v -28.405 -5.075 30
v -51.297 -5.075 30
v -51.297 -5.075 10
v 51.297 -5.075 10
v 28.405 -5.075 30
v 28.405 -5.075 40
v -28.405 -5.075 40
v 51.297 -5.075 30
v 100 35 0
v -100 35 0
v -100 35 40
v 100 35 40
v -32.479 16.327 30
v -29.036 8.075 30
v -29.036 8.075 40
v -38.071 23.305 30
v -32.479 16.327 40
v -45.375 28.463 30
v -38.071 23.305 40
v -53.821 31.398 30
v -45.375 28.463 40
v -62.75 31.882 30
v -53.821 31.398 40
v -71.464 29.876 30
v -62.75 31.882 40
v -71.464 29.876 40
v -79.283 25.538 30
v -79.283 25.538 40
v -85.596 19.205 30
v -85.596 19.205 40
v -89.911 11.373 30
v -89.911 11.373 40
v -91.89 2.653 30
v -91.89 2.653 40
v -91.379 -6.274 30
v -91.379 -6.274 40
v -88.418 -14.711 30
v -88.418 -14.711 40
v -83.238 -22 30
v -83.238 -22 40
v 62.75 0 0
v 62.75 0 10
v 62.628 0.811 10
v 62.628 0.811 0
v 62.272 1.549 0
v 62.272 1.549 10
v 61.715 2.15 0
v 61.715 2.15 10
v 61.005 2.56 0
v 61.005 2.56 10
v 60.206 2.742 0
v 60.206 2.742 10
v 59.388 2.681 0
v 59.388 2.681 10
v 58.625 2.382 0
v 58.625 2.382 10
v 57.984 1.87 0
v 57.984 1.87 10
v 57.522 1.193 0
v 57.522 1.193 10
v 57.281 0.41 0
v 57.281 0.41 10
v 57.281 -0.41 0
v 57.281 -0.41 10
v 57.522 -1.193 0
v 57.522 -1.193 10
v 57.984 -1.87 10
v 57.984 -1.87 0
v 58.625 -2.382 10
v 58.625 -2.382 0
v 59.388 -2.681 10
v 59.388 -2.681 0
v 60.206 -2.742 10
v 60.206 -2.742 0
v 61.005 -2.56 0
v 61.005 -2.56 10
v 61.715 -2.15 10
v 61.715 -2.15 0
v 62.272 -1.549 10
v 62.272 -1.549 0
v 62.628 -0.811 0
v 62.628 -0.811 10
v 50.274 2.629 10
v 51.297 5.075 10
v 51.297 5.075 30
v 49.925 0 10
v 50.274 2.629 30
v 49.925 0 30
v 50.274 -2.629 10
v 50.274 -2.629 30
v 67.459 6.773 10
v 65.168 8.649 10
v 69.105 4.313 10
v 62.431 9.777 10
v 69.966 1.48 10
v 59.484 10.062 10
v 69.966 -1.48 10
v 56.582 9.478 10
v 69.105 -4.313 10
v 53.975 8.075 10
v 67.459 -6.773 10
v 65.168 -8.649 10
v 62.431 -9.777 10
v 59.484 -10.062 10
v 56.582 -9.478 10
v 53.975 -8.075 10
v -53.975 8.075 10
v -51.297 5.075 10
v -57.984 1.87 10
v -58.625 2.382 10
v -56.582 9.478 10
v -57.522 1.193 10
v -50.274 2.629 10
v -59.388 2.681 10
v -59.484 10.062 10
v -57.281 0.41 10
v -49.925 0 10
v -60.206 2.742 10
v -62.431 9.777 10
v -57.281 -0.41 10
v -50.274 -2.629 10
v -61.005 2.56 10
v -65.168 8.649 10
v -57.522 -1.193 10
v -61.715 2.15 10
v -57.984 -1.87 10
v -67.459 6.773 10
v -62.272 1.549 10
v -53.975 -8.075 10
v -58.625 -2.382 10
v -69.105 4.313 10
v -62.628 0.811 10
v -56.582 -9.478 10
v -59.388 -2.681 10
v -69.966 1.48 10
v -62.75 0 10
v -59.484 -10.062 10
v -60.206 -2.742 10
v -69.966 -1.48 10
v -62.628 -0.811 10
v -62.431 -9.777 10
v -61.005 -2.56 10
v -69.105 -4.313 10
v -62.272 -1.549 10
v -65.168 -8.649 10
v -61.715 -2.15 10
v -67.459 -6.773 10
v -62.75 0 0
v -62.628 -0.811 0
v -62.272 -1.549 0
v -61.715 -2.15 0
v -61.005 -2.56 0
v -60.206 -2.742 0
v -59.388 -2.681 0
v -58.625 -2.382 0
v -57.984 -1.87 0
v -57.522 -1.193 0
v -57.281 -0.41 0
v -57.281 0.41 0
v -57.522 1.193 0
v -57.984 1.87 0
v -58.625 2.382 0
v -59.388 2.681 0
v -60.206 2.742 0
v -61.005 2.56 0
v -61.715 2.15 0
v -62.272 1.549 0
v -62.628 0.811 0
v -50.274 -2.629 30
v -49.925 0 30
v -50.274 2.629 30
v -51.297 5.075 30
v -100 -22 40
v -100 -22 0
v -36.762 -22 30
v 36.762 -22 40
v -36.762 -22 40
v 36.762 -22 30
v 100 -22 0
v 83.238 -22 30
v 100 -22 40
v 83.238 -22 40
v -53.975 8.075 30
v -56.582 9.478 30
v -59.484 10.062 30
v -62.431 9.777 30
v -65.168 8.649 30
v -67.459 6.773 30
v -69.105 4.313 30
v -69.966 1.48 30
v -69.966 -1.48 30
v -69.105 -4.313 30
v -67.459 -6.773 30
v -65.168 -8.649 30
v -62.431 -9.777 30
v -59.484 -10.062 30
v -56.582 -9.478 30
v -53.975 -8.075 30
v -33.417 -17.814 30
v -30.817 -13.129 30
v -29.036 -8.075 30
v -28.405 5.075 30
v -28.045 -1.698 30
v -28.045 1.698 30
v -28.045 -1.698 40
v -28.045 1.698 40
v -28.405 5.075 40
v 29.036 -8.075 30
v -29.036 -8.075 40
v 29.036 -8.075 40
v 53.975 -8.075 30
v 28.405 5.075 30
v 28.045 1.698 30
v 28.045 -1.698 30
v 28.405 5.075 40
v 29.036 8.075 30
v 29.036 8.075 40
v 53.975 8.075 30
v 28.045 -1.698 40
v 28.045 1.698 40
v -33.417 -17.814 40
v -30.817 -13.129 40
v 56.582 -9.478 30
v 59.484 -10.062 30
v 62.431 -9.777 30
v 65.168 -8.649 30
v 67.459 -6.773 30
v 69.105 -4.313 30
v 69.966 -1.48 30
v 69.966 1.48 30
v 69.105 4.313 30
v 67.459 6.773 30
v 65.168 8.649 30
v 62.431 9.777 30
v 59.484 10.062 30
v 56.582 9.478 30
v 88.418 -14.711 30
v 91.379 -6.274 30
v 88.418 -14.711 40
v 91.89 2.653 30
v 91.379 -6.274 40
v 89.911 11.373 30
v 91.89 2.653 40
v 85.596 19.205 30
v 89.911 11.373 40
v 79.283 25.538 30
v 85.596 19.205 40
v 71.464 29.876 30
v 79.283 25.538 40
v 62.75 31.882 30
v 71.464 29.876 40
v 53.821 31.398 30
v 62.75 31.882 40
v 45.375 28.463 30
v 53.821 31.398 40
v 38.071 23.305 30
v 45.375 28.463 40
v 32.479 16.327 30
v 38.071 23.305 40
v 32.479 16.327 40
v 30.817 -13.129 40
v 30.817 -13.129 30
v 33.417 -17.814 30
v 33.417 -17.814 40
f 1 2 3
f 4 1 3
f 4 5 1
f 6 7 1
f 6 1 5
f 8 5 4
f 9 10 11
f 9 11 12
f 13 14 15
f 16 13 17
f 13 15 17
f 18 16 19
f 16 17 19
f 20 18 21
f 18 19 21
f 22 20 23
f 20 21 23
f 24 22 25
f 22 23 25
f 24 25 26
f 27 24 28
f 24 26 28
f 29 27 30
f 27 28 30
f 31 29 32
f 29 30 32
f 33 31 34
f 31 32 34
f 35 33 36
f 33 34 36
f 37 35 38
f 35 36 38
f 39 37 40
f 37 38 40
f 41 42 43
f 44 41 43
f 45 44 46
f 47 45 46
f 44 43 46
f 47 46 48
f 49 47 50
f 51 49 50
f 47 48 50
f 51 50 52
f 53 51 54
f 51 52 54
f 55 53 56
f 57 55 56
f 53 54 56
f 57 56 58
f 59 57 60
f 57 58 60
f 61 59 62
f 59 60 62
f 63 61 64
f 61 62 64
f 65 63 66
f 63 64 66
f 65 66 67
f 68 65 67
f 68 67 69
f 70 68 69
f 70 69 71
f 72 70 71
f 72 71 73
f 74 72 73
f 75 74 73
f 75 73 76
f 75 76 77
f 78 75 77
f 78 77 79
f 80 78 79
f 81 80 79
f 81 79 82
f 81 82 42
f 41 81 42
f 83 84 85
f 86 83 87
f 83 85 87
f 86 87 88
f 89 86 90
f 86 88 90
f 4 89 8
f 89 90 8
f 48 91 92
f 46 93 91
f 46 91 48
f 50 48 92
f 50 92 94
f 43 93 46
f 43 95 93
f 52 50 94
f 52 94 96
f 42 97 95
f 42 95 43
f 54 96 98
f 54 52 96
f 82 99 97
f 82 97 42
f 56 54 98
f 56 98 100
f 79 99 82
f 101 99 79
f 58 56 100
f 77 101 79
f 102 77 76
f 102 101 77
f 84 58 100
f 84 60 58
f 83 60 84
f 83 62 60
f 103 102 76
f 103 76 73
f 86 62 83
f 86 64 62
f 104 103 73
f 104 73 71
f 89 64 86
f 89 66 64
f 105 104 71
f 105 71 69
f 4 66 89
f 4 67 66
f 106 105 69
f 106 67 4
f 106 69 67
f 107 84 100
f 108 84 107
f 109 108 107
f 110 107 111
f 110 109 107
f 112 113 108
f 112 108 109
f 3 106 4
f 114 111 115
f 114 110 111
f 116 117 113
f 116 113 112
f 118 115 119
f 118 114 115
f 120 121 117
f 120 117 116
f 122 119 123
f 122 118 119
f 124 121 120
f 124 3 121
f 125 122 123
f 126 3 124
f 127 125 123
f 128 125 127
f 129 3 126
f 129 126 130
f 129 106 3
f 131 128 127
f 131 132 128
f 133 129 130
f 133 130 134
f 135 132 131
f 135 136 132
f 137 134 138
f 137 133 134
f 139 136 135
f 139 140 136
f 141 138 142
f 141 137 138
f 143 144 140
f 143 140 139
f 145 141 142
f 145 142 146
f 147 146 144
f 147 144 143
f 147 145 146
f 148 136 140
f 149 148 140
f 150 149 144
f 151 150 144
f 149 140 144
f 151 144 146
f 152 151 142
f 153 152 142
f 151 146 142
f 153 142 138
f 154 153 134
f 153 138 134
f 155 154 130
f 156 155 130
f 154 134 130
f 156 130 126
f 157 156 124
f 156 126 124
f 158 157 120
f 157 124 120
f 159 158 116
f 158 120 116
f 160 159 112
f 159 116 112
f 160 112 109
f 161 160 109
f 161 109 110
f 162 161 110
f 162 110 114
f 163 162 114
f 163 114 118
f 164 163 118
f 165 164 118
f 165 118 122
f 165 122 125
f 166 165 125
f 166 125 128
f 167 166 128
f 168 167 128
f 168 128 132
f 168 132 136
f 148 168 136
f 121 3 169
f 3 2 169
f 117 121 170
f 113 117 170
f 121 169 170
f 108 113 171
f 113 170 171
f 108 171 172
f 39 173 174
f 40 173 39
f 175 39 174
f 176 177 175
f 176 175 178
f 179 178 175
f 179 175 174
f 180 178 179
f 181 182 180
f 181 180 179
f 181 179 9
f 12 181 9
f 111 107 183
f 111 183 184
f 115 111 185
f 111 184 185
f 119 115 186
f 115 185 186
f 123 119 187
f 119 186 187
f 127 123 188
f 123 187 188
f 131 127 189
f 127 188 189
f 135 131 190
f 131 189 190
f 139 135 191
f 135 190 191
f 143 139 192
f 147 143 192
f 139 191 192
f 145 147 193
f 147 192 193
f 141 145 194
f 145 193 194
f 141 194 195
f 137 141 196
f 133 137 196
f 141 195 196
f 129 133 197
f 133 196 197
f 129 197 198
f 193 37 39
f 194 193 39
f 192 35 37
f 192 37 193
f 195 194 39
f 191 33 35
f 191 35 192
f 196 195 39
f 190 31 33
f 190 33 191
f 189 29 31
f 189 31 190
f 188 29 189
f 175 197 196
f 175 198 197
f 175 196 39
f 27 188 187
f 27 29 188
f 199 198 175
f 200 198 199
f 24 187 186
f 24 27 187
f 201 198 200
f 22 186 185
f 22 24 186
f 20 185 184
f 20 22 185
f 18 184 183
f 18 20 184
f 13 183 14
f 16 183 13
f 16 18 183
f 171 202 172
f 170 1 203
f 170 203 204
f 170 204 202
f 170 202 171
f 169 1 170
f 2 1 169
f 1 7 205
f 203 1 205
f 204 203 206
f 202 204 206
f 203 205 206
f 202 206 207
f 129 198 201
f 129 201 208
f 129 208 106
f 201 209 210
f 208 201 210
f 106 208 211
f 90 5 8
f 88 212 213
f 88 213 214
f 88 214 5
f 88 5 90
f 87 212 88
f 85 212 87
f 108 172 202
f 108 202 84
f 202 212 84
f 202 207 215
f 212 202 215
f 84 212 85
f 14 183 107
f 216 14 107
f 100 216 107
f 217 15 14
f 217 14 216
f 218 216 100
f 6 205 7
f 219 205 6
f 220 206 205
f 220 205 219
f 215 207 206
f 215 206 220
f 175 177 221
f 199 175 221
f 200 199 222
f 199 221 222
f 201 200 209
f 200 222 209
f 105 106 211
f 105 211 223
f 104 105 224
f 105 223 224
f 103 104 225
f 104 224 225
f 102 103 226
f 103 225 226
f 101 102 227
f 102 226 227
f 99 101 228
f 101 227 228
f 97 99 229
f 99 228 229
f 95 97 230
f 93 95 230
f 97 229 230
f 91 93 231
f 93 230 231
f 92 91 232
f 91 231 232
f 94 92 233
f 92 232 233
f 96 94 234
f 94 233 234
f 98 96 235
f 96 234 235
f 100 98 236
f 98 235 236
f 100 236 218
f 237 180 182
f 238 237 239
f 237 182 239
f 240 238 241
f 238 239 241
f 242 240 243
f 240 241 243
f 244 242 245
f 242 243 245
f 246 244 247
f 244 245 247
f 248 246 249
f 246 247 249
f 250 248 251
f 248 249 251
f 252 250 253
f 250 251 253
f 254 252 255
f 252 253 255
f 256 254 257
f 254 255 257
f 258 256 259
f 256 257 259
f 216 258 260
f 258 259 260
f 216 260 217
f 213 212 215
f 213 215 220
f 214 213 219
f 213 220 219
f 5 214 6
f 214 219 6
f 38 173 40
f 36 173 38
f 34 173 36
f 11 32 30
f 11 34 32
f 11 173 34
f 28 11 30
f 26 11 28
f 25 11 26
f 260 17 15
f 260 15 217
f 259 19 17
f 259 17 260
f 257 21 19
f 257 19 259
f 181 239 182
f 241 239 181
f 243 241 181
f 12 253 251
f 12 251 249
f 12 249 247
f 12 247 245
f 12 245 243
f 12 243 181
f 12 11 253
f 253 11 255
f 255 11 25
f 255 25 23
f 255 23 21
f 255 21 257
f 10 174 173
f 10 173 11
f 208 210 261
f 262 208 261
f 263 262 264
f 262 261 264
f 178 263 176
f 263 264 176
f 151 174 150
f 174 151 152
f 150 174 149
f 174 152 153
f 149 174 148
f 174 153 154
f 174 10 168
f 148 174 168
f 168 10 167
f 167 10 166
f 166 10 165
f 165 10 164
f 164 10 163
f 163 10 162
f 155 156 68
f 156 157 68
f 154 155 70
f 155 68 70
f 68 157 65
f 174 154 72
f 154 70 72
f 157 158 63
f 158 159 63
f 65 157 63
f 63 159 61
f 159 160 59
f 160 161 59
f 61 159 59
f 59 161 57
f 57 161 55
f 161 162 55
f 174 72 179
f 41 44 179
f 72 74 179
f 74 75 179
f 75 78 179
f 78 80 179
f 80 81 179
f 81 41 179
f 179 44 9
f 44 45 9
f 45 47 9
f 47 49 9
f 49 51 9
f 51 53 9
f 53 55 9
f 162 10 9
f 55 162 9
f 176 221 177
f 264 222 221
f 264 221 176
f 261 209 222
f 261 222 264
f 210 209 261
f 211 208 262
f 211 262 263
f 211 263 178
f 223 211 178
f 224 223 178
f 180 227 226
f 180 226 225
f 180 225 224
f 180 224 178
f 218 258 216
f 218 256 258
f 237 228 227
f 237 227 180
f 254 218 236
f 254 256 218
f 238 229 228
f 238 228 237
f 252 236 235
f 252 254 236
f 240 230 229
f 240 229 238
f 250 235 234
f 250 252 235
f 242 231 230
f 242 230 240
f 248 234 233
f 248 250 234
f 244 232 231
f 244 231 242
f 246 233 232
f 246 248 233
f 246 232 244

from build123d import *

# Parameters (mm, degrees)
SKETCH1_W                     = 200
SKETCH1_H                     = 70
BOSS_EXTRUDE1_DEPTH           = 40
SHAFTFITS_REACH               = 115.248
SKETCH2_R                     = 2.75
SKETCH3_R                     = 8.075
PULLEY_DEPTH                  = 30
SKETCH4_R                     = 30
GEARS_FITS_DEPTH              = 10
GEAR_LETOUT_REACH             = 115.248
SKETCH5_W                     = 200
SKETCH5_H                     = 13
CLOSED_LOOP_TIMING_BELT_REACH = 115.248
SKETCH8_W                     = 120
SKETCH8_H                     = 3
SKETCH6_R                     = 32
GEAR_MARGIN_DEPTH             = 10
SKETCH7_R                     = 10.075
PULLEY_MARGIN_DEPTH           = 20


with BuildPart() as part:
    # Sketch1 → Boss-Extrude1 (new body)
    with BuildSketch(Plane.XY):
        Rectangle(SKETCH1_W, SKETCH1_H)
    extrude(amount=BOSS_EXTRUDE1_DEPTH)

    # Sketch2 → ShaftFits (cut, up to next)
    with BuildSketch(Plane.XY.offset(40), mode=Mode.PRIVATE) as shaftfits_sk1:
        with Locations((60, 0)):
            Circle(SKETCH2_R)
    shaftfits_tool1 = extrude(shaftfits_sk1.sketch, amount=-SHAFTFITS_REACH, mode=Mode.PRIVATE) & part.part
    # Sketch2 → ShaftFits (cut, up to next)
    with BuildSketch(Plane.XY.offset(40), mode=Mode.PRIVATE) as shaftfits_sk2:
        with Locations(Location((-60, 0, 0), (0, 0, 180))):
            Circle(SKETCH2_R)
    shaftfits_tool2 = extrude(shaftfits_sk2.sketch, amount=-SHAFTFITS_REACH, mode=Mode.PRIVATE) & part.part
    add(shaftfits_tool1.solids().sort_by_distance((60, 0, 40))[0], mode=Mode.SUBTRACT)
    add(shaftfits_tool2.solids().sort_by_distance((-60, 0, 40))[0], mode=Mode.SUBTRACT)

    # Sketch3 → Pulley (cut)
    with BuildSketch(Plane.XY.offset(40)):
        with Locations((60, 0)):
            Circle(SKETCH3_R)
        with Locations(Location((-60, 0, 0), (0, 0, 180))):
            Circle(SKETCH3_R)
    extrude(amount=-PULLEY_DEPTH, mode=Mode.SUBTRACT)

    # Sketch4 → Gears fits (cut)
    with BuildSketch(Plane.XY.offset(40)):
        with Locations((60, 0)):
            Circle(SKETCH4_R)
        with Locations(Location((-60, 0, 0), (0, 0, 180))):
            Circle(SKETCH4_R)
    extrude(amount=-GEARS_FITS_DEPTH, mode=Mode.SUBTRACT)

    # Sketch5 → Gear letout (cut, up to next)
    with BuildSketch(Plane.XY.offset(40), mode=Mode.PRIVATE) as gear_letout_sk1:
        with Locations((0, -28.5)):
            Rectangle(SKETCH5_W, SKETCH5_H)
    gear_letout_tool1 = extrude(gear_letout_sk1.sketch, amount=-GEAR_LETOUT_REACH, mode=Mode.PRIVATE) & part.part
    add(gear_letout_tool1.solids().sort_by_distance((0, -28.5, 40))[0], mode=Mode.SUBTRACT)

    # Closed-loop timing belt: up to this face of the body (flat: up to its plane)
    closed_loop_timing_belt_end = Plane(part.part.faces().sort_by_distance((-52.15339549, 0, 10))[0])
    # Sketch8 → Closed-loop timing belt (cut, up to the picked face)
    with BuildSketch(Plane.XY.offset(40), mode=Mode.PRIVATE) as closed_loop_timing_belt_sk1:
        with Locations((0, 6.575)):
            Rectangle(SKETCH8_W, SKETCH8_H)
    closed_loop_timing_belt_tool1 = split(extrude(closed_loop_timing_belt_sk1.sketch, amount=-CLOSED_LOOP_TIMING_BELT_REACH, mode=Mode.PRIVATE), bisect_by=closed_loop_timing_belt_end, keep=Keep.BOTH, mode=Mode.PRIVATE)
    # Sketch8 → Closed-loop timing belt (cut, up to the picked face)
    with BuildSketch(Plane.XY.offset(40), mode=Mode.PRIVATE) as closed_loop_timing_belt_sk2:
        with Locations((0, -6.575)):
            Rectangle(SKETCH8_W, SKETCH8_H)
    closed_loop_timing_belt_tool2 = split(extrude(closed_loop_timing_belt_sk2.sketch, amount=-CLOSED_LOOP_TIMING_BELT_REACH, mode=Mode.PRIVATE), bisect_by=closed_loop_timing_belt_end, keep=Keep.BOTH, mode=Mode.PRIVATE)
    add(closed_loop_timing_belt_tool1.solids().sort_by(Axis((0, 6.575, 40), (0, 0, -1)))[0], mode=Mode.SUBTRACT)
    add(closed_loop_timing_belt_tool2.solids().sort_by(Axis((0, -6.575, 40), (0, 0, -1)))[0], mode=Mode.SUBTRACT)

    # Sketch6 → Gear margin (cut)
    with BuildSketch(Plane.XY.offset(40)):
        with Locations((60, 0)):
            Circle(SKETCH6_R)
        with Locations((-60, 0)):
            Circle(SKETCH6_R)
    extrude(amount=-GEAR_MARGIN_DEPTH, mode=Mode.SUBTRACT)

    # Sketch7 → Pulley margin (cut)
    with BuildSketch(Plane.XY.offset(30)):
        with Locations((60, 0)):
            Circle(SKETCH7_R)
        with Locations((-60, 0)):
            Circle(SKETCH7_R)
    extrude(amount=-PULLEY_MARGIN_DEPTH, mode=Mode.SUBTRACT)


solid = part.part
